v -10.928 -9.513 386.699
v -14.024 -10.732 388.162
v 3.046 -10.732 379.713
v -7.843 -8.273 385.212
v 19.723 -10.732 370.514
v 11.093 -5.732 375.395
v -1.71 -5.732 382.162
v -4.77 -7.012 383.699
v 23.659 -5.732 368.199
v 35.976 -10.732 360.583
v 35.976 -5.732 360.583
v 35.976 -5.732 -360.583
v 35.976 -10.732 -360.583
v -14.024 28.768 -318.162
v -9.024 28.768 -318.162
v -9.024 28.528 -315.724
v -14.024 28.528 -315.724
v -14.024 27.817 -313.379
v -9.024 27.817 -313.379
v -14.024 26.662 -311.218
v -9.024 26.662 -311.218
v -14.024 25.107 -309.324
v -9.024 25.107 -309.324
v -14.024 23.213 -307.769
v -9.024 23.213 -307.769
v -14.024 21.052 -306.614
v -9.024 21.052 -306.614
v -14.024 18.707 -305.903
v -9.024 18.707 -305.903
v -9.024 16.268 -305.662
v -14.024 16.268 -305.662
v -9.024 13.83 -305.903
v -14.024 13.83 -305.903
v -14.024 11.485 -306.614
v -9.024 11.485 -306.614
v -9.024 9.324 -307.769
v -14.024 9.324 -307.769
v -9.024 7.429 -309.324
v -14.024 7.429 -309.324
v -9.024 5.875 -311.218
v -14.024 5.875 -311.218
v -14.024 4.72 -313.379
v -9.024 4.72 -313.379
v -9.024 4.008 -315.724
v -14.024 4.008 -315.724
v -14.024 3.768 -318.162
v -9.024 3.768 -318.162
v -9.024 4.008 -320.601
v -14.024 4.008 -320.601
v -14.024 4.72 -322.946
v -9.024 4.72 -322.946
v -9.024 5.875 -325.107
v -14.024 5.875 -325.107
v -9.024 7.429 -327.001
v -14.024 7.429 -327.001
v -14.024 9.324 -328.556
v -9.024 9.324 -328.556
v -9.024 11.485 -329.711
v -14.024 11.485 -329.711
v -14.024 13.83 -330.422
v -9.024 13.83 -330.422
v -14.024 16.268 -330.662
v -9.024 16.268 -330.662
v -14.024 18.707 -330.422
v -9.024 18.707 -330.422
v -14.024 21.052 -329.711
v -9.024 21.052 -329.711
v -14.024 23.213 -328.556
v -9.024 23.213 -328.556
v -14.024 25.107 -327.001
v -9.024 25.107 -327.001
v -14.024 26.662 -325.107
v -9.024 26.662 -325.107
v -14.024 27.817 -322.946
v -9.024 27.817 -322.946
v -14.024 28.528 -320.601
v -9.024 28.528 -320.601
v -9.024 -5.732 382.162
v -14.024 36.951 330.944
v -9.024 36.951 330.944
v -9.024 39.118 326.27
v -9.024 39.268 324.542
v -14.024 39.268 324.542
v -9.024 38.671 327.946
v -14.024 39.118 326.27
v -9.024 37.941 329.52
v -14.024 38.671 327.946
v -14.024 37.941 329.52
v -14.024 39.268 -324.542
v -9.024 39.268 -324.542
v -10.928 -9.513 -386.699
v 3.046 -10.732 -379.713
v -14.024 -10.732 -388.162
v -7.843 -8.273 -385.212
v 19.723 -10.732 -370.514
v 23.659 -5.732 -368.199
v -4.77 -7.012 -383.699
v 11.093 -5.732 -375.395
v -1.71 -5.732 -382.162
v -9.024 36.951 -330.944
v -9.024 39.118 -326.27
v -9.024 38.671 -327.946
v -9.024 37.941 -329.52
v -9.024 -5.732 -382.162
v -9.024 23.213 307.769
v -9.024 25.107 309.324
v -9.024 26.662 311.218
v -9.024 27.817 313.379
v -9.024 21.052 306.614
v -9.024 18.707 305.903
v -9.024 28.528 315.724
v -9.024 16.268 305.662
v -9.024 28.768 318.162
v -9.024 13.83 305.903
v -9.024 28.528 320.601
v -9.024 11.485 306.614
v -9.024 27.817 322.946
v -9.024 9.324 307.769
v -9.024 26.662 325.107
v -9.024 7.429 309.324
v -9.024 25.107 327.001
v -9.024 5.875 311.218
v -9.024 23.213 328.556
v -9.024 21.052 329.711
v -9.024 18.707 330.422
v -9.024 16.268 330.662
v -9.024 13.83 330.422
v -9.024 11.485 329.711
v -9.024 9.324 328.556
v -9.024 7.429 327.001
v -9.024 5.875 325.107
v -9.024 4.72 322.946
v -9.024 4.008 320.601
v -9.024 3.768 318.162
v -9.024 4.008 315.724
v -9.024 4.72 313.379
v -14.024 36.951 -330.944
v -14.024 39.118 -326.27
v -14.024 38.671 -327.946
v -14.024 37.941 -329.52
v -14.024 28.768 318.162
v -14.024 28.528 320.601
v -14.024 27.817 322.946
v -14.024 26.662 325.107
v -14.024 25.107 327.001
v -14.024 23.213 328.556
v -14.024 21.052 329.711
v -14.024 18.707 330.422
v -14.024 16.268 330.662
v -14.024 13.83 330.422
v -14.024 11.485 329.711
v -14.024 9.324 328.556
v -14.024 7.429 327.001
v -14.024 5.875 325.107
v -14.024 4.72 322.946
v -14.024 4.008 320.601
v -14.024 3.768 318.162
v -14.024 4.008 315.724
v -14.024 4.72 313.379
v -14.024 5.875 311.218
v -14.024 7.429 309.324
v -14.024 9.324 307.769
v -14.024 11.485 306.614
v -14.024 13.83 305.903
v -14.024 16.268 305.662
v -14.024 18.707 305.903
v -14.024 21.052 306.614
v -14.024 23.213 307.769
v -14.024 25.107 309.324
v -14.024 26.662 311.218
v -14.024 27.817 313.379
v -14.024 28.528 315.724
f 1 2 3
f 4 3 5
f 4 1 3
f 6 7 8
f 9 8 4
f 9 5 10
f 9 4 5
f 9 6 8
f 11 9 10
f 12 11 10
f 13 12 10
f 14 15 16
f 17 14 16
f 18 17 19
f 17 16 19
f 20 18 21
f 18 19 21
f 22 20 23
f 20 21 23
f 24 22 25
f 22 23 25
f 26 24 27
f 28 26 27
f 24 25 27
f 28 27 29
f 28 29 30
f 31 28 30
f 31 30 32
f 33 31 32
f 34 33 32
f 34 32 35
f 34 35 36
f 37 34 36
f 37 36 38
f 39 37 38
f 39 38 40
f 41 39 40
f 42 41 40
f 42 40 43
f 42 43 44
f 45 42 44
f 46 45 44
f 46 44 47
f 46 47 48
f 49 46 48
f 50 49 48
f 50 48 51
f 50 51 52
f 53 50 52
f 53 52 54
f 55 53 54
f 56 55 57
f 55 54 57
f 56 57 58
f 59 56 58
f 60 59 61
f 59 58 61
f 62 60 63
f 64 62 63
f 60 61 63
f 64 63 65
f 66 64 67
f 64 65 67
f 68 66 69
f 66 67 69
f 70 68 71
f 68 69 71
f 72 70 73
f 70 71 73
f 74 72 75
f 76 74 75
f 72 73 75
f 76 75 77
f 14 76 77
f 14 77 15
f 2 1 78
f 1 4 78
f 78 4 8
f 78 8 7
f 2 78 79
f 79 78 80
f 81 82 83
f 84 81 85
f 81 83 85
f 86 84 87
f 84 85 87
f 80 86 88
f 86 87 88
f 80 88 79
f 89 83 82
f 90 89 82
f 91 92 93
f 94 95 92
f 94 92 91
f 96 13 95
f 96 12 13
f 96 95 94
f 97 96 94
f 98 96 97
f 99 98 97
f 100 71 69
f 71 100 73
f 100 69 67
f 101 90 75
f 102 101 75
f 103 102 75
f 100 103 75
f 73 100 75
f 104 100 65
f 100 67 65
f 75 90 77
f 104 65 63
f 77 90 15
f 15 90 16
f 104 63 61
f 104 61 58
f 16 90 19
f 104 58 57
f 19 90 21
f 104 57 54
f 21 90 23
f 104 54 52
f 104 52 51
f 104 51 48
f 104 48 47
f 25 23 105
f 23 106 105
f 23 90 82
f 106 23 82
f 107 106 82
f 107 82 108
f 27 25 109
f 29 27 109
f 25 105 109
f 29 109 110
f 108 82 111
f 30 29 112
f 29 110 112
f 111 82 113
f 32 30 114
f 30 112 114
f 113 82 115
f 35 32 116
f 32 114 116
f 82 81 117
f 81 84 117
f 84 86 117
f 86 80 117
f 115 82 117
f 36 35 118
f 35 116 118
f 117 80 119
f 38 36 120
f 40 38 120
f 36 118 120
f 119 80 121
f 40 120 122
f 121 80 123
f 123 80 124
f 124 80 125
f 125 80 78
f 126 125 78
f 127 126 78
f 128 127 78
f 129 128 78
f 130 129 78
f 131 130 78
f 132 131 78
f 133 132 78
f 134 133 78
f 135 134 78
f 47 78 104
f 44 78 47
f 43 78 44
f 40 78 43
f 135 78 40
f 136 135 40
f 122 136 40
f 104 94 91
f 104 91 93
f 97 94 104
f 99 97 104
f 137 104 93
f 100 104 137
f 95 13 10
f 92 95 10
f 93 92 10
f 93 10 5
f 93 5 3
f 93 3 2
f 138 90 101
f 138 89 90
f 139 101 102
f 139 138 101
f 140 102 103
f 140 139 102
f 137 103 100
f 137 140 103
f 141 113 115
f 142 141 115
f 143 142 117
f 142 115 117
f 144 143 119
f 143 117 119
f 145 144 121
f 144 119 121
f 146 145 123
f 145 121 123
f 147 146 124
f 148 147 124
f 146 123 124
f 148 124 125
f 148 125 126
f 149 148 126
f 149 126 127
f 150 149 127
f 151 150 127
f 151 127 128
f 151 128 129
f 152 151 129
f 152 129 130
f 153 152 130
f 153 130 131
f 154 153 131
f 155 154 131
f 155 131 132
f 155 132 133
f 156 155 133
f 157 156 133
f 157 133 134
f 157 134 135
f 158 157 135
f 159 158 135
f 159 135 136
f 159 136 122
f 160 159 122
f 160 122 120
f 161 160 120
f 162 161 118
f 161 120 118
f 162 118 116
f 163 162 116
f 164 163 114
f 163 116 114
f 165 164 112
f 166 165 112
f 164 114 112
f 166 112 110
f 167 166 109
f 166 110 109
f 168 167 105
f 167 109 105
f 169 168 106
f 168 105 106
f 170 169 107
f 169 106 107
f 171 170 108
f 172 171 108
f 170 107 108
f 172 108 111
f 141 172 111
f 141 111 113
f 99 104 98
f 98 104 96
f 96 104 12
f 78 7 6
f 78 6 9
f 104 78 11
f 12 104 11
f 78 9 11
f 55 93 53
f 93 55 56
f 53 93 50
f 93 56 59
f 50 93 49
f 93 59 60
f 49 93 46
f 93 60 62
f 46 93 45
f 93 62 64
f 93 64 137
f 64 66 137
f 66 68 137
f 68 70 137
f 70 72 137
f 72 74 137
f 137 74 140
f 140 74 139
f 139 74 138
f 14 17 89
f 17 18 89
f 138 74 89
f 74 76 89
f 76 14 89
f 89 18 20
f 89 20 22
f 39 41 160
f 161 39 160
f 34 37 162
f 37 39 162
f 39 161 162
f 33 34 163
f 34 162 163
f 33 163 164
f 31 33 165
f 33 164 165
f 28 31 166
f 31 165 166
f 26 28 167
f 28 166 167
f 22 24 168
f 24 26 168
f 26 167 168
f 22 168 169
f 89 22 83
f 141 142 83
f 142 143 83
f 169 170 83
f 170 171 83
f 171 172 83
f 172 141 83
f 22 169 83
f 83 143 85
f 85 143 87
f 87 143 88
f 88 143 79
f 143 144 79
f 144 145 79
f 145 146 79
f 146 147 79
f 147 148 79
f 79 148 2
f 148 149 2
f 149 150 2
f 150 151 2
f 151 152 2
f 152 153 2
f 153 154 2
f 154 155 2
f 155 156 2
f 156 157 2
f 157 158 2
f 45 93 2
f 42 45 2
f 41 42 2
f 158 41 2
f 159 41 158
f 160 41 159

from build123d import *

# Parameters (mm, degrees)
BOSS_EXTRUDE1_DEPTH = 500
CUT_EXTRUDE1_DEPTH  = 70
CUT_EXTRUDE2_DEPTH  = 35
FILLET1_R           = 10
SKETCH4_R           = 12.5
CUT_EXTRUDE3_DEPTH  = 70


with BuildPart() as part:
    # Sketch1 → Boss-Extrude1 (new, symmetric)
    with BuildSketch(Plane.XY):
        Polygon((-14.024390244, 39.268292683), (-9.024390244, 39.268292683), (-9.024390244, -5.731707317), (35.975609756, -5.731707317), (35.975609756, -10.731707317), (-14.024390244, -10.731707317), align=None)
    extrude(amount=BOSS_EXTRUDE1_DEPTH, both=True)

    # Sketch2 → Cut-Extrude1 (cut)
    with BuildSketch(Plane(origin=(0, 39.268292683, 0), x_dir=(1, 0, 0), z_dir=(0, 1, 0))):
        with BuildLine():
            Line((-62.224317274, 529.897722978), (58.968835914, 529.897722978))
            Line((58.968835914, 529.897722978), (58.968835914, 344.739681267))
            ThreePointArc((58.968835914, 344.739681267), (0.874290628, 380.84092237), (-62.224317274, 407.238677616))
            Line((-62.224317274, 407.238677616), (-62.224317274, 529.897722978))
        make_face()
        with BuildLine():
            Line((75.729591142, -524.740567523), (-50.6207175, -524.740567523))
            Line((-50.6207175, -524.740567523), (-50.6207175, -403.255719892))
            ThreePointArc((-50.6207175, -403.255719892), (8.569896952, -376.772838636), (63.086584035, -341.661548879))
            Line((63.086584035, -341.661548879), (75.729591142, -341.661548879))
            Line((75.729591142, -341.661548879), (75.729591142, -524.740567523))
        make_face()
    extrude(amount=-CUT_EXTRUDE1_DEPTH, mode=Mode.SUBTRACT)

    # Sketch3 → Cut-Extrude2 (cut, symmetric)
    with BuildSketch(Plane(origin=(-9.024390244, 0, 0), x_dir=(0, 0, -1), z_dir=(1, 0, 0))):
        Polygon((388.162337174, -10.731707317), (328.162337174, 39.268292683), (388.162337174, 39.268292683), align=None)
    cut_extrude2 = extrude(amount=CUT_EXTRUDE2_DEPTH, both=True, mode=Mode.SUBTRACT)

    # Mirror1: Cut-Extrude2 across plane
    add(cut_extrude2.mirror(Plane.XY), mode=Mode.SUBTRACT)

    # Fillet1
    fillet1_edges = [part.edges().sort_by_distance(p)[0] for p in [
        (-11.524390244, 39.268292683, -328.162337174),
        (-11.524390244, 39.268292683, 328.162337174),
    ]]
    fillet(fillet1_edges, radius=FILLET1_R)

    # Sketch4 → Cut-Extrude3 (cut)
    with BuildSketch(Plane(origin=(-9.024390244, 0, 0), x_dir=(0, 0, -1), z_dir=(1, 0, 0))):
        with Locations(Location((318.162337174, 16.268292683, 0), (0, 0, 90))):
            Circle(SKETCH4_R)
        with Locations(Location((-318.162337174, 16.268292683, 0), (0, 0, 90))):
            Circle(SKETCH4_R)
    extrude(amount=-CUT_EXTRUDE3_DEPTH, mode=Mode.SUBTRACT)


solid = part.part
